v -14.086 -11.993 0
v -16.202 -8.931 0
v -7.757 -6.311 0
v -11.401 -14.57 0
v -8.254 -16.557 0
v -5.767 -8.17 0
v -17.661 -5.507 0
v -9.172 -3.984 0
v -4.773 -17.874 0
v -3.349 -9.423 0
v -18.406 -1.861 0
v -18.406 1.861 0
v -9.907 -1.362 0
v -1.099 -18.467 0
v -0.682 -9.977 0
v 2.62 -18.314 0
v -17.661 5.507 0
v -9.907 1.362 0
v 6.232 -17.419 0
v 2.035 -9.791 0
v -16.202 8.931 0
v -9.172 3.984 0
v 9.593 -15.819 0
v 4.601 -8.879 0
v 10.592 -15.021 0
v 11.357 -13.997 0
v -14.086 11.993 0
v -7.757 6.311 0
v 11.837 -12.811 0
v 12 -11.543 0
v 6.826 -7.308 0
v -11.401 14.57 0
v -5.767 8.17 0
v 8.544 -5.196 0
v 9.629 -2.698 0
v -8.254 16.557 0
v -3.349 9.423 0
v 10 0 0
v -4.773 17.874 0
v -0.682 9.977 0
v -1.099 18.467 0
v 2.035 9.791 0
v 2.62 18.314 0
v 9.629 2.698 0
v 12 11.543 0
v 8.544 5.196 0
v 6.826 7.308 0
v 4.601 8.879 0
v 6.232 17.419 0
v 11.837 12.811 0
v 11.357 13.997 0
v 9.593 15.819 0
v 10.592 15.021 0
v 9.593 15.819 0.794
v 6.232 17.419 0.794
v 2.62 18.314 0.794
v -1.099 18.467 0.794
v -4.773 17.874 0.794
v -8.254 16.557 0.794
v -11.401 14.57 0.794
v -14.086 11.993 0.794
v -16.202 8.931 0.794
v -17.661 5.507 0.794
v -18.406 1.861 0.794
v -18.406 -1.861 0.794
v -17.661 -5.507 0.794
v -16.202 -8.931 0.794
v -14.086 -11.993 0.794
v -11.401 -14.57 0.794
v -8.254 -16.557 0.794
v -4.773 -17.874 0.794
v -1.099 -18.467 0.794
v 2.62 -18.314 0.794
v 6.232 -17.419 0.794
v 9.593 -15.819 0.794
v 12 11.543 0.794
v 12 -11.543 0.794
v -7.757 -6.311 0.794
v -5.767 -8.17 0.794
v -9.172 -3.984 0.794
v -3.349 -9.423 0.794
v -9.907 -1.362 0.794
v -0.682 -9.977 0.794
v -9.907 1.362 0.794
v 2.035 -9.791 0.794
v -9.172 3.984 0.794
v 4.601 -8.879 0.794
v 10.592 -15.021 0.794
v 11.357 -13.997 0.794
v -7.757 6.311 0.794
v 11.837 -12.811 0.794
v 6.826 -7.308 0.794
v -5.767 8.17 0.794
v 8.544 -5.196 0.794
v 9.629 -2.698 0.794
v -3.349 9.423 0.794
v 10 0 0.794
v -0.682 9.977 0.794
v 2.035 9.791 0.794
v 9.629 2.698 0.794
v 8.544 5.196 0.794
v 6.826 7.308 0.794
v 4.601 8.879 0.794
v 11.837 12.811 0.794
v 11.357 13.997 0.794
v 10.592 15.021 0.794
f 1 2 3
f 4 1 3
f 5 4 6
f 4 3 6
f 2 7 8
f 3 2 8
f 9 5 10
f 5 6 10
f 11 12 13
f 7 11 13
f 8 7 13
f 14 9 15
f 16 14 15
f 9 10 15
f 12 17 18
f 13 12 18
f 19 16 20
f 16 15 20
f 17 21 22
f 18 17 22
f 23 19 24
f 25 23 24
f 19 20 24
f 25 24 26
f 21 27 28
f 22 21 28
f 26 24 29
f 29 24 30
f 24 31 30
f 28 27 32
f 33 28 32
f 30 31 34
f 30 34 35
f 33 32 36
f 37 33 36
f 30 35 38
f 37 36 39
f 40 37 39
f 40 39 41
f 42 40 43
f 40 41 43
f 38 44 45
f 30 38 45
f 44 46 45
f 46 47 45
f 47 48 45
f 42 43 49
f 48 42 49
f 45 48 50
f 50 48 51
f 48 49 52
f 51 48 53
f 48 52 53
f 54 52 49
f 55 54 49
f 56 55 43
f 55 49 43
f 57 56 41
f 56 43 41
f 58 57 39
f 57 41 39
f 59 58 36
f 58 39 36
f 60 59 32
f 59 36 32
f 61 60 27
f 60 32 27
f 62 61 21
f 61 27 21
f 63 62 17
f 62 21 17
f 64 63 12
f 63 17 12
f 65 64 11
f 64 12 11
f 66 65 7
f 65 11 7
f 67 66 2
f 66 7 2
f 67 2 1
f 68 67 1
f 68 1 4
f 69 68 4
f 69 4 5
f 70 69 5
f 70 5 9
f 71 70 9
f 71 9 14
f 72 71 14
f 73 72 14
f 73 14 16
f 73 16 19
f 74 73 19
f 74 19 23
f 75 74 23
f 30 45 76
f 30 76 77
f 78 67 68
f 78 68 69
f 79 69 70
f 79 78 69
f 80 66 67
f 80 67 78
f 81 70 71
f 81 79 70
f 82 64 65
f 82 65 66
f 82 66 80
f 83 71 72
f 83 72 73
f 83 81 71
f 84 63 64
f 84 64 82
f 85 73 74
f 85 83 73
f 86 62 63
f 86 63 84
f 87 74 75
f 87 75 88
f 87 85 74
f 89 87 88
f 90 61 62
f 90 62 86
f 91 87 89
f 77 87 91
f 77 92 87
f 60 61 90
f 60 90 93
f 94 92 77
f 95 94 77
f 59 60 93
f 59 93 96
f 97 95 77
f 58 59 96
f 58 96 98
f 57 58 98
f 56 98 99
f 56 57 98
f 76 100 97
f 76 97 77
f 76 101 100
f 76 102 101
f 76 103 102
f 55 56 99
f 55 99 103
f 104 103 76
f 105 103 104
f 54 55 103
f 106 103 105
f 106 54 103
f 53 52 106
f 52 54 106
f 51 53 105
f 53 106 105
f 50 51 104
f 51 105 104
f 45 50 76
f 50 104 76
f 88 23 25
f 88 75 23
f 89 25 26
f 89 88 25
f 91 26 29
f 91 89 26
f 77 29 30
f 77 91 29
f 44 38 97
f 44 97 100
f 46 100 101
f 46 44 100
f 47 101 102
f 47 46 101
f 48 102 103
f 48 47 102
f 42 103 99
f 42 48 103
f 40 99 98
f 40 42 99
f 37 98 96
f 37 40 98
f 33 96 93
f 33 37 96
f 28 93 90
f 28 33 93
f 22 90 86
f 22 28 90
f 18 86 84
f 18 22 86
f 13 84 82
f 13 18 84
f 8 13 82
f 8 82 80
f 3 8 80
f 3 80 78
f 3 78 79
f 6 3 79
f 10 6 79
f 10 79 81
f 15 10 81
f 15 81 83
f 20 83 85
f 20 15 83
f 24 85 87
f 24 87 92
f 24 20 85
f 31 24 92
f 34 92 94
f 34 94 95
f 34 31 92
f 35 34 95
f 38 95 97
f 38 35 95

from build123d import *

# Parameters (mm, degrees)
SKETCH1_R           = 18.5
SKETCH1_R_2         = 10
BOSS_EXTRUDE1_DEPTH = 0.79375
CUT_EXTRUDE3_DEPTH  = 27.174988807
FILLET1_R           = 5


with BuildPart() as part:
    # Sketch1 → Boss-Extrude1 (new body)
    with BuildSketch(Plane.XY):
        Circle(SKETCH1_R)
        Circle(SKETCH1_R_2, mode=Mode.SUBTRACT)
    extrude(amount=BOSS_EXTRUDE1_DEPTH)

    # Sketch1<3> → Cut-Extrude3 (cut, through all)
    with BuildSketch(Plane.XY):
        with BuildLine():
            ThreePointArc((18.5, 0), (16.796577032, 7.75403121), (12, 14.08012784))
            Line((12, 14.08012784), (12, -14.08012784))
            ThreePointArc((12, -14.08012784), (16.796577032, -7.75403121), (18.5, 0))
        make_face()
    extrude(amount=CUT_EXTRUDE3_DEPTH, mode=Mode.SUBTRACT)

    # Fillet1
    fillet1_edges = [part.edges().sort_by_distance(p)[0] for p in [
        (12, -14.08012784, 0.396875),
        (12, 14.08012784, 0.396875),
    ]]
    fillet(fillet1_edges, radius=FILLET1_R)


solid = part.part
